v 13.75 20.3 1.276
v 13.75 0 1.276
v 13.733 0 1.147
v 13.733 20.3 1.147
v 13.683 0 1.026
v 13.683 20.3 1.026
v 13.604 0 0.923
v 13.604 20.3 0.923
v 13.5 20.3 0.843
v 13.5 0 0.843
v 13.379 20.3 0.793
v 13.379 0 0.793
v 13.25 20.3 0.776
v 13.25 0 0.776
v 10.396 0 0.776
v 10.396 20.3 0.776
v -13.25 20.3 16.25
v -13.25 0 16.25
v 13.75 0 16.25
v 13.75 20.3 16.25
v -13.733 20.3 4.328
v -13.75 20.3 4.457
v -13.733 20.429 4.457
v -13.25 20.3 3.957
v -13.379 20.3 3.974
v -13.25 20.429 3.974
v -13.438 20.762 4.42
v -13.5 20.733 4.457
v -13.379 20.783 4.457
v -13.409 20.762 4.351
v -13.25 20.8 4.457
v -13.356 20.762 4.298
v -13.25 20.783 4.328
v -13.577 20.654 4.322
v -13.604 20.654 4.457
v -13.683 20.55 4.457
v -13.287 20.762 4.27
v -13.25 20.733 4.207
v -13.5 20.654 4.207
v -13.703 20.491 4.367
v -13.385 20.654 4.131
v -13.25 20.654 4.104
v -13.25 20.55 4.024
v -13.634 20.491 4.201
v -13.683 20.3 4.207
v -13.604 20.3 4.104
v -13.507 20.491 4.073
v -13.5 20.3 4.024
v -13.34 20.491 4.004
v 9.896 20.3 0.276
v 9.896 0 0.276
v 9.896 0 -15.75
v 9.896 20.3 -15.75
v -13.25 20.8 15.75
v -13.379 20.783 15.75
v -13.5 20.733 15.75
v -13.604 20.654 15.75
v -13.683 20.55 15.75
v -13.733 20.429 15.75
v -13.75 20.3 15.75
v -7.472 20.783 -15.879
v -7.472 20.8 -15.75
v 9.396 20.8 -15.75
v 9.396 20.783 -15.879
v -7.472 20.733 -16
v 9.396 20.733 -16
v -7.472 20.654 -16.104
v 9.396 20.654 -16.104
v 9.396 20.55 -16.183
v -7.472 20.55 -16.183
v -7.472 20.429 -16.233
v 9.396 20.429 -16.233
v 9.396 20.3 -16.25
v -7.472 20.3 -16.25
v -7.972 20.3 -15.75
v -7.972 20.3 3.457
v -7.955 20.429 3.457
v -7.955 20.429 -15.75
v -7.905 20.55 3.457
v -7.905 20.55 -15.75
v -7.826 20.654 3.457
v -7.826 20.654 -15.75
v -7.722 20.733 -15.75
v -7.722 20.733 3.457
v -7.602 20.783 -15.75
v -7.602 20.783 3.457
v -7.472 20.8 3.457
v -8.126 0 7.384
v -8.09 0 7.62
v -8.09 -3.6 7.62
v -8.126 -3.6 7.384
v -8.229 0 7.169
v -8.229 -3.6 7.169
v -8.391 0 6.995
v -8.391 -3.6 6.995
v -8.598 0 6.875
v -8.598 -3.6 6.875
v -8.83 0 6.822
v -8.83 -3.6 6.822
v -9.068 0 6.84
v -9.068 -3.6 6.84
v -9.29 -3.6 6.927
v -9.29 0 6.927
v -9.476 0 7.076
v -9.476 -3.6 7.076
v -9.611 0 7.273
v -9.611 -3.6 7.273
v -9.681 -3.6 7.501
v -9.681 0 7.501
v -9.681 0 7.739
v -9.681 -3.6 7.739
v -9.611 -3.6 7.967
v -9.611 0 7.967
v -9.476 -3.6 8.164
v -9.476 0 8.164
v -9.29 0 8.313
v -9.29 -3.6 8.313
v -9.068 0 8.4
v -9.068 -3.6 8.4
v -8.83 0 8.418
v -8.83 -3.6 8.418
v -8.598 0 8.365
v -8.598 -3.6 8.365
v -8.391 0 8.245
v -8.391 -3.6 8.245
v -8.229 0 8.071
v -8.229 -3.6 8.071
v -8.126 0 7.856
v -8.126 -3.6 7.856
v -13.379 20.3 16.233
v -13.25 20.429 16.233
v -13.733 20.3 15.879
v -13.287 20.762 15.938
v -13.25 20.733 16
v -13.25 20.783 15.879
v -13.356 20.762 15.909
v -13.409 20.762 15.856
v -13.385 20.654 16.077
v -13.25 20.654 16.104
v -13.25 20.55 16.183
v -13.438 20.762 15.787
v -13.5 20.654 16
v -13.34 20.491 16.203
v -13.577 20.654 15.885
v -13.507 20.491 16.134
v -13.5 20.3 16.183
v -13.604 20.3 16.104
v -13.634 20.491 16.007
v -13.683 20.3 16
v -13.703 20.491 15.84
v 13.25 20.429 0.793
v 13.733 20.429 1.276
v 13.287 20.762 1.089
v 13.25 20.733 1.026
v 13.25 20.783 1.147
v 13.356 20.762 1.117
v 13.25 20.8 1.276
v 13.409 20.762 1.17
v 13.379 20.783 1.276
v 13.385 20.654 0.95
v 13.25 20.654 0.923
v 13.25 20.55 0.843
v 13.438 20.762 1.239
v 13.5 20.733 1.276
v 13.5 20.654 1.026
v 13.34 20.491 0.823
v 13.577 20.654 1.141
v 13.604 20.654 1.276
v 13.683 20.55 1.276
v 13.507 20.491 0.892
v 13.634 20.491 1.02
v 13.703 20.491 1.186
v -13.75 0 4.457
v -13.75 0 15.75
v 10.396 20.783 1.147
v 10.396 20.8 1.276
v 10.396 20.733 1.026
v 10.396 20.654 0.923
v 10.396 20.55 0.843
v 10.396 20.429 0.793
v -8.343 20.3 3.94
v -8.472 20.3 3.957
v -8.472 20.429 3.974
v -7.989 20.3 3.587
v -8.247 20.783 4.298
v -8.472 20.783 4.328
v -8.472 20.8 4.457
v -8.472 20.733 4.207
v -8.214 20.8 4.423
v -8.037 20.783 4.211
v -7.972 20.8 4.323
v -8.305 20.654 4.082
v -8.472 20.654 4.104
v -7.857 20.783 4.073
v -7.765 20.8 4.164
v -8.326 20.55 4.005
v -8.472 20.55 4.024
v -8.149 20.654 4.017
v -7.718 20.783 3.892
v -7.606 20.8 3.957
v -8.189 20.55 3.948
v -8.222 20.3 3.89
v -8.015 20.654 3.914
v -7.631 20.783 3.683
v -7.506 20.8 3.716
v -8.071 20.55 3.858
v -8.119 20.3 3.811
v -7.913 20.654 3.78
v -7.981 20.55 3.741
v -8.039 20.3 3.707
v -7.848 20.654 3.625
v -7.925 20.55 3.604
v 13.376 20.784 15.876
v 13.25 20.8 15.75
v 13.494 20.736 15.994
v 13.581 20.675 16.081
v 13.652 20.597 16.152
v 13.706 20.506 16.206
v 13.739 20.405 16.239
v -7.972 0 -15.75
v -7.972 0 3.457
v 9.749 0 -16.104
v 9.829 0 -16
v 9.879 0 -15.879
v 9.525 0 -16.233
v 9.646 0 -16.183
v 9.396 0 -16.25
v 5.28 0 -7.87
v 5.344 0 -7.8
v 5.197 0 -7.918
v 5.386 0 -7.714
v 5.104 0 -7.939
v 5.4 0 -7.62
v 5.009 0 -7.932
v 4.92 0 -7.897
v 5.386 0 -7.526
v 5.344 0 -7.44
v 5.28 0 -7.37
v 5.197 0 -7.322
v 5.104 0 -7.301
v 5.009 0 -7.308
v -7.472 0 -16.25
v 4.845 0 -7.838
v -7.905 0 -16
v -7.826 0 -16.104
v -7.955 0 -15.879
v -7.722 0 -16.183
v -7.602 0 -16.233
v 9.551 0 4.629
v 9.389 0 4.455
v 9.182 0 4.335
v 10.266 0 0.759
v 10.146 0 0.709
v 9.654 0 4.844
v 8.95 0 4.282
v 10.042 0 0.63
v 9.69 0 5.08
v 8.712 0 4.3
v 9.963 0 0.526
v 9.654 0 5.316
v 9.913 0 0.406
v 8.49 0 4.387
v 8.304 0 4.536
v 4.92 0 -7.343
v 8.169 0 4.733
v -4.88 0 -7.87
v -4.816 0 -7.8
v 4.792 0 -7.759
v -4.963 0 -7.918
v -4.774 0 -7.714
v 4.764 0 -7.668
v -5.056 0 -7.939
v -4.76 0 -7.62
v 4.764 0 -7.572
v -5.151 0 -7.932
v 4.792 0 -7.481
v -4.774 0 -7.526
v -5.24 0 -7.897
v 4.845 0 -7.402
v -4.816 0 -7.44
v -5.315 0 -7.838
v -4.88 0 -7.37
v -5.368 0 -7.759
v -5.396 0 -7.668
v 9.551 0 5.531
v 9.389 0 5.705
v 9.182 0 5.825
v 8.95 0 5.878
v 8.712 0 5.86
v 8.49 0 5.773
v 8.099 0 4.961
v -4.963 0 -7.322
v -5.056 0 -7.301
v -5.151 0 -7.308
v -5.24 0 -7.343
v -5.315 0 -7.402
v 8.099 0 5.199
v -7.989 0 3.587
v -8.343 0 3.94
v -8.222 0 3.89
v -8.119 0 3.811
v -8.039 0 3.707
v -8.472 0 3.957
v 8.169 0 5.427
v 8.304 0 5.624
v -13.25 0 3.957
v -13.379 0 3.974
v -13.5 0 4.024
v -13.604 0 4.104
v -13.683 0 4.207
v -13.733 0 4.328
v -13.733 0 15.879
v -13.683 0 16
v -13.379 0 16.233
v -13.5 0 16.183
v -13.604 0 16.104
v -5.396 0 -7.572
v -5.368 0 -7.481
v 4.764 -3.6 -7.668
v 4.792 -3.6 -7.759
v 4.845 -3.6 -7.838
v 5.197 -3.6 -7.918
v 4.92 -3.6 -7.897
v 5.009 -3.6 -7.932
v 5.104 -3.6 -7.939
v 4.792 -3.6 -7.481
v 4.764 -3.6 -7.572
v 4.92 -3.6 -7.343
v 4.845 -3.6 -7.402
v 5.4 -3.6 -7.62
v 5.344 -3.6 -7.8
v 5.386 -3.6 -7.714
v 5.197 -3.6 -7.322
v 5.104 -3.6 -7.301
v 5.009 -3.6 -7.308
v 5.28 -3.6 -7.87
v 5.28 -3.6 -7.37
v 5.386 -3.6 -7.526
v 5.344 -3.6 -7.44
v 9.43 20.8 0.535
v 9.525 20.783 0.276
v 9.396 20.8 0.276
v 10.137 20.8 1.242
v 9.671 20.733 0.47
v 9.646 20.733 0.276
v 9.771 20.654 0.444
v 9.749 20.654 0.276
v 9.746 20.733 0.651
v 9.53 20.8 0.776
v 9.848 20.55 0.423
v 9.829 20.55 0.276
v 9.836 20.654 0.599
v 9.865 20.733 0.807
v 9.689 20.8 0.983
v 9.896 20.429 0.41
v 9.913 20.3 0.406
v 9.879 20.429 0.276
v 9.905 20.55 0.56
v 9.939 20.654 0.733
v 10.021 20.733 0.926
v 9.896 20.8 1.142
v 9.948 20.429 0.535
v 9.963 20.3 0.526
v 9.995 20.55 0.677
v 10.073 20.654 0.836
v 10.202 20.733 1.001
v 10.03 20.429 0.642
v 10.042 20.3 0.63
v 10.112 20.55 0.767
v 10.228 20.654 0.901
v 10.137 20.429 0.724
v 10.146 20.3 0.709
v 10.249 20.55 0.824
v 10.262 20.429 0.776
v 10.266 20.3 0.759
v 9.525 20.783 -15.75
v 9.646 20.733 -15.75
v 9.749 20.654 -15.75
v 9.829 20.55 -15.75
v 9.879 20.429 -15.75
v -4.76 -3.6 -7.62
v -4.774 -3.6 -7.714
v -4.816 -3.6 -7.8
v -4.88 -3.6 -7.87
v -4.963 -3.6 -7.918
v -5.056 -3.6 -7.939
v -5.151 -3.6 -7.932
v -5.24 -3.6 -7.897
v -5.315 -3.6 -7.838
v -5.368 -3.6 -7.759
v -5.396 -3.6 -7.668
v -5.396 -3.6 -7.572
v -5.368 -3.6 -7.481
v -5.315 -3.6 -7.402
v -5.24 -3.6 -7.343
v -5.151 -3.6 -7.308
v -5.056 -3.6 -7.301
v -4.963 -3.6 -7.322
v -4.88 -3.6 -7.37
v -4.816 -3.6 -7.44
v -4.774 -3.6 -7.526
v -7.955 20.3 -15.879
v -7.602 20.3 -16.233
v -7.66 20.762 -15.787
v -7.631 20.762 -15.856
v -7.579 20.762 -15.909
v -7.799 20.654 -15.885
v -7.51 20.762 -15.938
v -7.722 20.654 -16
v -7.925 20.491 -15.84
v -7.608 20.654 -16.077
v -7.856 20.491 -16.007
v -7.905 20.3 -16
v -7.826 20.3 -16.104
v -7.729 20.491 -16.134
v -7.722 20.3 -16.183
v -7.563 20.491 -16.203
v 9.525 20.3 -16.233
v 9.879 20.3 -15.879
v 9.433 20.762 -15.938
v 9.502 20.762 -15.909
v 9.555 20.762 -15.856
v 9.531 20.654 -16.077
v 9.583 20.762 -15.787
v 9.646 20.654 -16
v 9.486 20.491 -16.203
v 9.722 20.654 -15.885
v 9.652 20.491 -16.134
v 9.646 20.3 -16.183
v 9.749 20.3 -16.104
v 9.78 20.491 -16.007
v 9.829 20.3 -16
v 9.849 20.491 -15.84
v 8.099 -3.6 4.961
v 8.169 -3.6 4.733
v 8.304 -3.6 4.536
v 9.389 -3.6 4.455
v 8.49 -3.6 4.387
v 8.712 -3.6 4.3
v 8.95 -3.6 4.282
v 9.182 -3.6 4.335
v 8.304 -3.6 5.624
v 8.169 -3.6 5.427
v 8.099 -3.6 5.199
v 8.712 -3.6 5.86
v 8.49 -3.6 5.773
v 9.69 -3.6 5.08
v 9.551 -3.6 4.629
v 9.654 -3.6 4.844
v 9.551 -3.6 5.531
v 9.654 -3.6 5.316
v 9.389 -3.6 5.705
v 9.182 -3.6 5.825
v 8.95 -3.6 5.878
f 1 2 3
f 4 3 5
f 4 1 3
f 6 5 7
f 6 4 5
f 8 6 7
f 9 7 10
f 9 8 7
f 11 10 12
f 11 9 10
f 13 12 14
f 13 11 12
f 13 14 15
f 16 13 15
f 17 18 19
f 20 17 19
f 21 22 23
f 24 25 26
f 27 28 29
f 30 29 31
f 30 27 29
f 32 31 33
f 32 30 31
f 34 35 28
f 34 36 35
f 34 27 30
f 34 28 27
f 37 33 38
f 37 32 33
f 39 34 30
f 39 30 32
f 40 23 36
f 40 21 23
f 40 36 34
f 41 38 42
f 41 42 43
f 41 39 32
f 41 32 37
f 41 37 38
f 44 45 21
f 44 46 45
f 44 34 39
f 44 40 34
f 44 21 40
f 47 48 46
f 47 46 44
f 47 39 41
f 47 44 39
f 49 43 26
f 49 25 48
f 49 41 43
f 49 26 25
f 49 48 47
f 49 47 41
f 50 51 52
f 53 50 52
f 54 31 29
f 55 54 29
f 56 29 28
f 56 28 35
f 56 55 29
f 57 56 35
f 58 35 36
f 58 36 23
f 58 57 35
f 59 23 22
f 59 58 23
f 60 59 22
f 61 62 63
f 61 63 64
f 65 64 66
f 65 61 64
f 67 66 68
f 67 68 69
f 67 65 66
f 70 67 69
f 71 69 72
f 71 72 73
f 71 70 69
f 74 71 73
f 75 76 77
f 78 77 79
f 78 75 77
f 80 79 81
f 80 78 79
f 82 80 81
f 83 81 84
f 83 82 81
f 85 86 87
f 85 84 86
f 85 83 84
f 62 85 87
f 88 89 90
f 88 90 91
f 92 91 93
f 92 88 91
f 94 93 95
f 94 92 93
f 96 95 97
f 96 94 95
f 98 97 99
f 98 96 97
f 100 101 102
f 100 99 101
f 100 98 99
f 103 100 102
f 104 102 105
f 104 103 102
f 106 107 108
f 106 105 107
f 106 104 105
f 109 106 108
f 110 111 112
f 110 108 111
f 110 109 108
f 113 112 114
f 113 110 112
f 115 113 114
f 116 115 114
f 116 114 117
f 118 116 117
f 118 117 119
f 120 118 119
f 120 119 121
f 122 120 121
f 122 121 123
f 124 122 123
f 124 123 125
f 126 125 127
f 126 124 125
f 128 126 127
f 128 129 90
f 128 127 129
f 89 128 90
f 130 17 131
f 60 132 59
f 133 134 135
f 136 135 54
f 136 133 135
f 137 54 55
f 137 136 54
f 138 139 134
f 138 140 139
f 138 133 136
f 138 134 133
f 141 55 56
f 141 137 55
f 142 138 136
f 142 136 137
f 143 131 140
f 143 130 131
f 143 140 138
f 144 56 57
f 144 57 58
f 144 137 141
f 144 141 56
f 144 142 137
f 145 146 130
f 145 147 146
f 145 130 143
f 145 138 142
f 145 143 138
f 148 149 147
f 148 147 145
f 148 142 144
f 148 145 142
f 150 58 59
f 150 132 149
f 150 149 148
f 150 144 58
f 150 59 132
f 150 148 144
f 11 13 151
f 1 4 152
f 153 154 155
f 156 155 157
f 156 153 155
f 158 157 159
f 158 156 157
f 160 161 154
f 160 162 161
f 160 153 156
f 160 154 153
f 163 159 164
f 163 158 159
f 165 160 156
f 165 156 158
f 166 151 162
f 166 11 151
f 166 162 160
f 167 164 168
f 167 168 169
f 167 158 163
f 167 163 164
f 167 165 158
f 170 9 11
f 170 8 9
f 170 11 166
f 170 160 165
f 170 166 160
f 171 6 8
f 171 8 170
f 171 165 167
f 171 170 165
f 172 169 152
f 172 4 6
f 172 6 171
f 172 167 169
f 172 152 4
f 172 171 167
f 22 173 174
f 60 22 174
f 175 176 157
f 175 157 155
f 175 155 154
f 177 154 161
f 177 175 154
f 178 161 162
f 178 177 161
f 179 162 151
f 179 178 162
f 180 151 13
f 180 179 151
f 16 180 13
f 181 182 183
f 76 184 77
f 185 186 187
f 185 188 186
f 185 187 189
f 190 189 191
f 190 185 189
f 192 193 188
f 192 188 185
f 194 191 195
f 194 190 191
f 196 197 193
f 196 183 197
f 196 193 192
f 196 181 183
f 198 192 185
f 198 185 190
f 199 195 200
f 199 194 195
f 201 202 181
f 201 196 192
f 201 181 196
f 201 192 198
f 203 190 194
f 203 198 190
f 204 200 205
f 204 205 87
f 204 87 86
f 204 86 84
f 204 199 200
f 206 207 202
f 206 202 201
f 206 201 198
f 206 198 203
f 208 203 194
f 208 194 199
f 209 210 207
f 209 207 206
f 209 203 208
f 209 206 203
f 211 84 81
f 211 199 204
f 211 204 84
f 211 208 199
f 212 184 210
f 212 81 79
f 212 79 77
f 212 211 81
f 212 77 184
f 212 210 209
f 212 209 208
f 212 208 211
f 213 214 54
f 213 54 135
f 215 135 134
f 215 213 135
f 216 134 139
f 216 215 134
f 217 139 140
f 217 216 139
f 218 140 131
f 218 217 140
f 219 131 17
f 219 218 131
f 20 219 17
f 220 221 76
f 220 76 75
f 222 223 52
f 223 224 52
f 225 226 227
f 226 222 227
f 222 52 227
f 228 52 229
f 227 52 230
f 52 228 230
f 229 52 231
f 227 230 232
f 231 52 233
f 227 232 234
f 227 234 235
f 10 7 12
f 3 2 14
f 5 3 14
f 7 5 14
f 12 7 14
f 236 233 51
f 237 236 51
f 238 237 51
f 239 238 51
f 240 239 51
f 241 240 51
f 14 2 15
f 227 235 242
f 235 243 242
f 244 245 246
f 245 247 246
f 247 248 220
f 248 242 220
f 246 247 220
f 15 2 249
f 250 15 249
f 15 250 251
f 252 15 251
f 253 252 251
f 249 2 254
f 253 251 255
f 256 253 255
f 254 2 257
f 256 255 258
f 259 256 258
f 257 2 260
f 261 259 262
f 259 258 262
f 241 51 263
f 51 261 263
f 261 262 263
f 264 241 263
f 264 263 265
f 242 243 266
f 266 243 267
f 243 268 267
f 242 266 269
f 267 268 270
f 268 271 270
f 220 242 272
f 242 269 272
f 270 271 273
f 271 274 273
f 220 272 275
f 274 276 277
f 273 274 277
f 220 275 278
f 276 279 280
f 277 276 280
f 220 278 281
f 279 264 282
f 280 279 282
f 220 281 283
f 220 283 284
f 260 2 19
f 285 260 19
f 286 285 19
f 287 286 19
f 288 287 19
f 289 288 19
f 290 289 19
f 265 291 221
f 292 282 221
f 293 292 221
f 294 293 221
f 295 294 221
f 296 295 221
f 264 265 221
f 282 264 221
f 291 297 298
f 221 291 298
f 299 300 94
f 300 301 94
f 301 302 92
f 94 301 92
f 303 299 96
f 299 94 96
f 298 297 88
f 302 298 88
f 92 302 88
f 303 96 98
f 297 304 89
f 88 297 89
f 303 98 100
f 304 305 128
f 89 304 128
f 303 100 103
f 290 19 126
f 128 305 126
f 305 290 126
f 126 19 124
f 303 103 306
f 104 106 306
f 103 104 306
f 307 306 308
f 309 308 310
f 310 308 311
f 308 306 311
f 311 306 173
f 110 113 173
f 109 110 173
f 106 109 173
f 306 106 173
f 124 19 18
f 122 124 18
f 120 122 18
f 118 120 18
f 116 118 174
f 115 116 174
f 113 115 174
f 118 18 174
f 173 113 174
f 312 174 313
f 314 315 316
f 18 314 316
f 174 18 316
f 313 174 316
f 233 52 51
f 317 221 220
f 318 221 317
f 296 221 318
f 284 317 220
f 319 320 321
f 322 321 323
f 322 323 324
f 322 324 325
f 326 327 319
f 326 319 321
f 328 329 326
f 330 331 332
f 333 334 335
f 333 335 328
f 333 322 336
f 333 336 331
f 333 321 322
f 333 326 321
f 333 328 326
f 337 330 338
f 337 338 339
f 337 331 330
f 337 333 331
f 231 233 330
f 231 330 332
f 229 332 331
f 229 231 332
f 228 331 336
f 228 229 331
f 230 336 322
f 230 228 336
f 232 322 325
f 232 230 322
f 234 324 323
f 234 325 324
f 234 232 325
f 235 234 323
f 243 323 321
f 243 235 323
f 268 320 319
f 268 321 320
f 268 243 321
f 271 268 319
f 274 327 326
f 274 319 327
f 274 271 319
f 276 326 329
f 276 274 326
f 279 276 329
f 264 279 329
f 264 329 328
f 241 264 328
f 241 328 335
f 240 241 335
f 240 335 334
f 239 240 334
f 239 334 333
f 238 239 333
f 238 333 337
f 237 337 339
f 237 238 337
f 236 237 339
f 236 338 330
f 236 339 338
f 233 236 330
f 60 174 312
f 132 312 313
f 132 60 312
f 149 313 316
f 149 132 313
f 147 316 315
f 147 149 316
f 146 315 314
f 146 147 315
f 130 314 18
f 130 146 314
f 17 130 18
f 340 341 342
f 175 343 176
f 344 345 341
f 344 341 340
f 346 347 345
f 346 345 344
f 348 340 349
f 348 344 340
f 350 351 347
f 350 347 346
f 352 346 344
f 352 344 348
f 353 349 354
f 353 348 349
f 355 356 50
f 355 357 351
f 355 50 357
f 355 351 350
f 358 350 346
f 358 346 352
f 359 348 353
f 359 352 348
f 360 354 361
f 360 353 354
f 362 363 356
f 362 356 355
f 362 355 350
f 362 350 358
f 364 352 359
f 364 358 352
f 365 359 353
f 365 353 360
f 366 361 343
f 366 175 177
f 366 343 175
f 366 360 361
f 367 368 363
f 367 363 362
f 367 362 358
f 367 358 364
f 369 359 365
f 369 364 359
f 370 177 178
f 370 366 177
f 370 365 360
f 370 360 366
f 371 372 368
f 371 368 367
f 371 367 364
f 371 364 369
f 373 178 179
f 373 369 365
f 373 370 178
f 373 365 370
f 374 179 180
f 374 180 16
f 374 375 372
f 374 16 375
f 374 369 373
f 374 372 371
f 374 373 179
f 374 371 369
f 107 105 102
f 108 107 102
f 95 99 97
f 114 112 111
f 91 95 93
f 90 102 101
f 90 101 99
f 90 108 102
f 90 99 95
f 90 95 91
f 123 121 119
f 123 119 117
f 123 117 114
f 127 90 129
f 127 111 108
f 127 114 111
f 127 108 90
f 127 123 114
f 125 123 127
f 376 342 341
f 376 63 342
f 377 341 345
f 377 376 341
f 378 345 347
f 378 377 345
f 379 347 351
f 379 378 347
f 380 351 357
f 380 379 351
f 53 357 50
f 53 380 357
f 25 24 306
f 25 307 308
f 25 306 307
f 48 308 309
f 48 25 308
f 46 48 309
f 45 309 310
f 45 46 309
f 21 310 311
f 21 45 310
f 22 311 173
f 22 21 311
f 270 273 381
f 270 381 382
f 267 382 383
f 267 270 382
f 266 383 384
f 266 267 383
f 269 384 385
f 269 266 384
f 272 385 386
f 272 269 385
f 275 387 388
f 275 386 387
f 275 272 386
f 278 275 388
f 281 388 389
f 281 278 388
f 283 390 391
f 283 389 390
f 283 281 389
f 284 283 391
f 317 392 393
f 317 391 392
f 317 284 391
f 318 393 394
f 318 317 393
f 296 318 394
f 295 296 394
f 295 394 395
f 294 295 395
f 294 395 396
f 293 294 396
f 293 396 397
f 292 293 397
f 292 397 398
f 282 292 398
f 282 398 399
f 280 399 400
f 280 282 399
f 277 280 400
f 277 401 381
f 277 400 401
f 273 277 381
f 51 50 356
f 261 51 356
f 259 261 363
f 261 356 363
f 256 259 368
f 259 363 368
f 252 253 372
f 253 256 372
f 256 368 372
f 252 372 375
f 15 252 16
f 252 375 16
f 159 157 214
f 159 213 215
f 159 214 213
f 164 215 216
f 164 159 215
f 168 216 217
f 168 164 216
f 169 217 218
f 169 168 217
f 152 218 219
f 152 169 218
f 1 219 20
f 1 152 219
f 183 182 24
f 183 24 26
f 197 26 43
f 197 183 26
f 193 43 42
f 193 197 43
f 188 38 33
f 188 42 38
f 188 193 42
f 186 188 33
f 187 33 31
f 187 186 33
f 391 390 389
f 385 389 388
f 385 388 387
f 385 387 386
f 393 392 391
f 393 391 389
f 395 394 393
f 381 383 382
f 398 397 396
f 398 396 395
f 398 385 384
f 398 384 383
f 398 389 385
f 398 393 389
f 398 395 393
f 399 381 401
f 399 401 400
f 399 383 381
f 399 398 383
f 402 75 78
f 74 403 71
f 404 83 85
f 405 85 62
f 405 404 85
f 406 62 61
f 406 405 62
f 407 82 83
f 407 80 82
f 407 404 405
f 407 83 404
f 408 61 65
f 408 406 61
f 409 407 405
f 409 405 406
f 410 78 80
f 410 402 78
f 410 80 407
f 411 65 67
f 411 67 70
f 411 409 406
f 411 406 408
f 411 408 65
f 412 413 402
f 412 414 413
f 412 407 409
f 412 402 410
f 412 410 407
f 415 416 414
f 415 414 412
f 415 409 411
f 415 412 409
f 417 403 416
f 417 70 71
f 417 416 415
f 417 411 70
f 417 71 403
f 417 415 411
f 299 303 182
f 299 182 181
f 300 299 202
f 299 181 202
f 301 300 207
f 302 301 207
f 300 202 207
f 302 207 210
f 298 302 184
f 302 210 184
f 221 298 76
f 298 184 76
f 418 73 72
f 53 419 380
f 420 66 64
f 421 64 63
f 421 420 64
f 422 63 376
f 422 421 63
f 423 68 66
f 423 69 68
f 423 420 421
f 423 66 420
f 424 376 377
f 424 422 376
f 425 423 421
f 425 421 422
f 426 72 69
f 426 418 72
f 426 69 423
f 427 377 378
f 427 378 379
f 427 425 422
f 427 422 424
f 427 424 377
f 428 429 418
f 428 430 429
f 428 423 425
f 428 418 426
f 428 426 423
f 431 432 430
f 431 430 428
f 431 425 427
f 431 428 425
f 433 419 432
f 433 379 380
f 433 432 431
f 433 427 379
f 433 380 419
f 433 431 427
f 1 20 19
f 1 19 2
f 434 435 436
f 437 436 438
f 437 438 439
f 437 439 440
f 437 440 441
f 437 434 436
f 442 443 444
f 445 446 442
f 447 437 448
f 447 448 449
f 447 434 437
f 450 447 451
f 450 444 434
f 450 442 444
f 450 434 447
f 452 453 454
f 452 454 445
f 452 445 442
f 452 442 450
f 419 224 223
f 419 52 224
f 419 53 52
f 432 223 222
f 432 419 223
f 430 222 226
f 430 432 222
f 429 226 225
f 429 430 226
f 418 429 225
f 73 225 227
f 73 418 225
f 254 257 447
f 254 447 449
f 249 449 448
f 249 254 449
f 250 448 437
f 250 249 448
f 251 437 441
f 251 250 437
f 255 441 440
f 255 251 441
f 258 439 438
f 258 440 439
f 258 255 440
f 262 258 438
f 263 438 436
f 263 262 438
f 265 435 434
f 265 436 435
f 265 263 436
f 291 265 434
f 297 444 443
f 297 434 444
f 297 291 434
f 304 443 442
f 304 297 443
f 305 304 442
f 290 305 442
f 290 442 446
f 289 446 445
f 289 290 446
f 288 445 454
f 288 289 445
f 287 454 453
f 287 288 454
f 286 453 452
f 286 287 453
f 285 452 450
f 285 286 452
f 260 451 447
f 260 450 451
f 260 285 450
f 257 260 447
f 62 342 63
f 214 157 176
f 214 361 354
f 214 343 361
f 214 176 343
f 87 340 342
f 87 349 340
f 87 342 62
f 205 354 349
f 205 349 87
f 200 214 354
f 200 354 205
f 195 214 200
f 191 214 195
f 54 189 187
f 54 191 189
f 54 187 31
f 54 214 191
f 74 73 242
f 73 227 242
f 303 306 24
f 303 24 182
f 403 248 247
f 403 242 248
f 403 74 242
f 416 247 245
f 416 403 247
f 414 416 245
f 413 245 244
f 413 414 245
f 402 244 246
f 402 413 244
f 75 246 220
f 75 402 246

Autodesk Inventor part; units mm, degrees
ref_plane "YZ Plane" through (0, 0, 0) normal (1, 0, 0) x (0, 1, 0)
ref_plane "XZ Plane" through (0, 0, 0) normal (0, 1, 0) x (-1, 0, 0)
ref_plane "XY Plane" through (0, 0, 0) normal (0, 0, 1) x (1, 0, 0)
sketch "Sketch1" plane through (0, 0, 0) normal (0, 1, 0) x (-1, 0, 0)
  line L0 (13.75, 16.25) -> (-13.75, 16.25)
  line L1 (-13.75, 16.25) -> (-13.75, -16.25)
  line L2 (-13.75, -16.25) -> (13.75, -16.25)
  line L3 (13.75, -16.25) -> (13.75, 16.25)
  line L4 (-13.75, 0.7762) -> (-9.8958, 0.7762)
  line L5 (-9.8958, 0.7762) -> (-9.8958, -16.25)
  line L6 (13.75, 3.9572) -> (7.9724, 3.9572)
  line L7 (7.9724, 3.9572) -> (7.9724, -16.25)
  point P0 (0, 0)
  dimension "d0" = 27.5
  dimension "d1" = 13.75
  dimension "d2" = 32.5
  dimension "d3" = 16.25
extrude "Extrusion1" add sketch "Sketch1" along normal blind 20.8 contours L3 L6 L7 L2 L5 L4 L1 L0
sketch "Sketch2" plane through (0, 0, 0) normal (0, -1, 0) x (1, 0, 0)
  circle A0 centre (-8.89, 7.62) radius 0.8
  circle A1 centre (8.89, 5.08) radius 0.8
  circle A2 centre (-5.08, -7.62) radius 0.32
  circle A3 centre (5.08, -7.62) radius 0.32
  point P0 (0, 0)
  dimension "d6" = 0.64
  dimension "d7" = 0.64
  dimension "d8" = 3.81
  dimension "d9" = 13.97
  dimension "d10" = 17.78
  dimension "d11" = 2.54
  dimension "d12" = 15.24
  dimension "d13" = 0
  dimension "d14" = 5.08
  dimension "d15" = 7.62
  dimension "d16" = 1.6
  dimension "d17" = 1.6
extrude "Extrusion2" add sketch "Sketch2" along normal blind 3.6
fillet "Fillet1" radius 0.5 15 edges at (-7.9724, 10.4, 3.9572) (-7.9724, 10.4, -16.25) (-13.75, 10.4, 3.9572) (-13.75, 10.4, 16.25) (9.8958, 10.4, -16.25) (13.75, 10.4, 0.7762) (9.8958, 10.4, 0.7762) (0, 20.8, 16.25) (-13.75, 20.8, 10.1036) (-10.8612, 20.8, 3.9572) (-7.9724, 20.8, -6.1464) (0.9617, 20.8, -16.25) (9.8958, 20.8, -7.7369) (11.8229, 20.8, 0.7762) (13.75, 20.8, 8.5131)
properties part number "JTN1AS-PA-F-DC5V_Relay"
